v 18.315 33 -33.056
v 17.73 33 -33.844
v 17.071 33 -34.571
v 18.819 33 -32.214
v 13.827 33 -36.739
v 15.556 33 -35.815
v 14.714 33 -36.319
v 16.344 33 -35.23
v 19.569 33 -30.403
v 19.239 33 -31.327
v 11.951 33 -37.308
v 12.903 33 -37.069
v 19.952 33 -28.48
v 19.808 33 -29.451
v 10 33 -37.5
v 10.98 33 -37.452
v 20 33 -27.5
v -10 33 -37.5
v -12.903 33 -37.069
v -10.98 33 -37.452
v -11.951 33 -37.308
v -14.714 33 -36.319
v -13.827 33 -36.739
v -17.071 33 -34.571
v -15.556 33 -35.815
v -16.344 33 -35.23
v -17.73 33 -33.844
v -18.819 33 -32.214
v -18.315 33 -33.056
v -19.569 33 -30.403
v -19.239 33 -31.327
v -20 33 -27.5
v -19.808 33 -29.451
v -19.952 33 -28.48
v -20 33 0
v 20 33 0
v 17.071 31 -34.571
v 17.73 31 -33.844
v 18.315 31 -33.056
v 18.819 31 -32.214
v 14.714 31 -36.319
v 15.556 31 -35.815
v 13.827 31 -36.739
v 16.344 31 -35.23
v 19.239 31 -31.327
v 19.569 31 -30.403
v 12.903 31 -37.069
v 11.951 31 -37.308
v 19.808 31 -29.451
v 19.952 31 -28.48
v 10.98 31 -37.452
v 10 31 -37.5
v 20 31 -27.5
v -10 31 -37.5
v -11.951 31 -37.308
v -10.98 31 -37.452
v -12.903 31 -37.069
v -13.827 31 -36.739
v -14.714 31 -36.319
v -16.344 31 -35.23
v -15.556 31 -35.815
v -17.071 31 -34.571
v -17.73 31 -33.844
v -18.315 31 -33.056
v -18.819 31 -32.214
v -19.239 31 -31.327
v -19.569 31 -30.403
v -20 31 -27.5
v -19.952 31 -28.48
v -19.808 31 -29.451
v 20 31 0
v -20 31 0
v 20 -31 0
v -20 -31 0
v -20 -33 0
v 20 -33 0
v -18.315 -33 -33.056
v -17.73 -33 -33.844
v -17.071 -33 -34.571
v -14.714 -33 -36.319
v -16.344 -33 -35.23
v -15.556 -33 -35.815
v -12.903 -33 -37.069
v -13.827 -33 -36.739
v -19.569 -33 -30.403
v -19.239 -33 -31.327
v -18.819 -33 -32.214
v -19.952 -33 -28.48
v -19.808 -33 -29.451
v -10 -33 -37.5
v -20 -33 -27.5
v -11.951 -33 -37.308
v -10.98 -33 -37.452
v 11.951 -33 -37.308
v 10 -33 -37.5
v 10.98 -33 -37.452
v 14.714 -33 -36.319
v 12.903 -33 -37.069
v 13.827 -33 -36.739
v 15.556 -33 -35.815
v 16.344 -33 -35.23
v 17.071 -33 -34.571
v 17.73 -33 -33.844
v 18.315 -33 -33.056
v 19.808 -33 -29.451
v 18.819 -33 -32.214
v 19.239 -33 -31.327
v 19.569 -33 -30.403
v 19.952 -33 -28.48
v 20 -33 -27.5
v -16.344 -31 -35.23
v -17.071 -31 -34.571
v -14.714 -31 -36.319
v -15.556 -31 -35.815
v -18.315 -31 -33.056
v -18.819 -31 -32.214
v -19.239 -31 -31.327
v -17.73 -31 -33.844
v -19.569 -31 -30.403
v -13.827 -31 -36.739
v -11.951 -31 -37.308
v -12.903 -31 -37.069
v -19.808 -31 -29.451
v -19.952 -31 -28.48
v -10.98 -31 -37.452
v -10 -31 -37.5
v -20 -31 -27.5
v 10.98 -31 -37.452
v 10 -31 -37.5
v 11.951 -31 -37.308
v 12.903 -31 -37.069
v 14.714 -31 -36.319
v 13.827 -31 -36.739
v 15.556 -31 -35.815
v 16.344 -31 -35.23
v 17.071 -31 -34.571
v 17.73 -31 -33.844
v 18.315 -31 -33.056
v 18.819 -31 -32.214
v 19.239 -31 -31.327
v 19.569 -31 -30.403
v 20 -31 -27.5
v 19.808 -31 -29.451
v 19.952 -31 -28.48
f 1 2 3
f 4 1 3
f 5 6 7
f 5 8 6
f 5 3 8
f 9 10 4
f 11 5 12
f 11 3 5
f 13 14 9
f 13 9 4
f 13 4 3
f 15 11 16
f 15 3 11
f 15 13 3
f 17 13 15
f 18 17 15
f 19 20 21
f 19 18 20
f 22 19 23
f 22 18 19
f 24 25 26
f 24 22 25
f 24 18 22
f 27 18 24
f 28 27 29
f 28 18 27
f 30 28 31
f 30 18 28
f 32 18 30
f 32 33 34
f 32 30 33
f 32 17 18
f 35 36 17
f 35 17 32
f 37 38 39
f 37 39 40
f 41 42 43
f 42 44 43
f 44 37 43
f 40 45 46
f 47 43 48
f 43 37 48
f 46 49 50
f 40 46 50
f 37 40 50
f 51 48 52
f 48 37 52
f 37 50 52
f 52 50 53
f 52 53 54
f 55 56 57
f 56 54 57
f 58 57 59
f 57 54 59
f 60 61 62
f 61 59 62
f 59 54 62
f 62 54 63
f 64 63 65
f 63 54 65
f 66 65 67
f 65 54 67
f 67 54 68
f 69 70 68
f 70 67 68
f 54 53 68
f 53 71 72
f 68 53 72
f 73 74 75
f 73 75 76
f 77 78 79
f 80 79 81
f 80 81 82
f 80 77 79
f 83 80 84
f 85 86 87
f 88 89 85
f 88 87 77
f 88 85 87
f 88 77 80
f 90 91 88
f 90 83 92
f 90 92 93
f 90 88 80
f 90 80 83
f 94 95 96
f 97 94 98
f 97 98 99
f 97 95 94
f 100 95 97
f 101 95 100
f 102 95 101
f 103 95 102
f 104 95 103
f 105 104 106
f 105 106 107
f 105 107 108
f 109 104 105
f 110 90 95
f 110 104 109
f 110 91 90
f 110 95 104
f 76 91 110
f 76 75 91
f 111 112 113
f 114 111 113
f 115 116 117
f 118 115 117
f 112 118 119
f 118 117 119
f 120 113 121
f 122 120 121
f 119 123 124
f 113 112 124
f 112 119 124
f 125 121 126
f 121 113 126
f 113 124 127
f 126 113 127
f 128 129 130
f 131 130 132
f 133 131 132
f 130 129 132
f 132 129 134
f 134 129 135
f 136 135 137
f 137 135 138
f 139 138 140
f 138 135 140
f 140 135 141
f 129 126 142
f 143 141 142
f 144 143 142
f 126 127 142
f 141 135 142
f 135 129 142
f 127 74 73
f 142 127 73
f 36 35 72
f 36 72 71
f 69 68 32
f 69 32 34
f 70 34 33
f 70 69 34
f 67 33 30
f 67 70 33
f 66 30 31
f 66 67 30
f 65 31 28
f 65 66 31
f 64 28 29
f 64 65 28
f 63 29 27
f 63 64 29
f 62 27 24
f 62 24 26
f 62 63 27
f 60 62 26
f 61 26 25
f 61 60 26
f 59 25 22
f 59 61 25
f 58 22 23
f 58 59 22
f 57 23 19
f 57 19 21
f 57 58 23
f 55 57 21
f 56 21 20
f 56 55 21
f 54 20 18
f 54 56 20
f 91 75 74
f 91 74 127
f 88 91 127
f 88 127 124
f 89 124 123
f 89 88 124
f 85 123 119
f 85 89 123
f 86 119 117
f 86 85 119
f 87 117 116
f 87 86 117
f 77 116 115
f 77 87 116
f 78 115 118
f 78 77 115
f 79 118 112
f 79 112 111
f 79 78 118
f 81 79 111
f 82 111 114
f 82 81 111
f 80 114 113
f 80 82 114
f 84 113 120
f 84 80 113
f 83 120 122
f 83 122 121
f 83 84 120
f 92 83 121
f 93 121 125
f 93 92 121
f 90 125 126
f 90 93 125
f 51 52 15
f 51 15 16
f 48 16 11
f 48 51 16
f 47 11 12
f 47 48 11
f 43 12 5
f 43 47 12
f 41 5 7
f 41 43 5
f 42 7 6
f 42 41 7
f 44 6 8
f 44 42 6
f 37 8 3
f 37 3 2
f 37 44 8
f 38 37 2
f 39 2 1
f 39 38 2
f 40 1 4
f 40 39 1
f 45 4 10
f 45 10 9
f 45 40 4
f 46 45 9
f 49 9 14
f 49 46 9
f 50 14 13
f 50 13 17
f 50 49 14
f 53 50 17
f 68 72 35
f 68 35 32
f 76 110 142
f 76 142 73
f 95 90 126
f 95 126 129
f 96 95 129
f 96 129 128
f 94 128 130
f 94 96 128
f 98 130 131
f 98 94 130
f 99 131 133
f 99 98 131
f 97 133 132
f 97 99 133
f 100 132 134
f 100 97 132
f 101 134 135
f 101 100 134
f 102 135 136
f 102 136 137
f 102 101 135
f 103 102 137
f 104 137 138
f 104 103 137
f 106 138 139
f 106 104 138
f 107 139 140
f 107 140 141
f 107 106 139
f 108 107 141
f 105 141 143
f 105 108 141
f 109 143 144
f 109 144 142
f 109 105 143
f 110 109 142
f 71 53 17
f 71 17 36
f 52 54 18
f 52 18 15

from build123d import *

# Parameters (mm, degrees)
F1_DEPTH  = 50
F2_R      = 5
F4_DEPTH  = 1
F5_T      = -2
F8_DEPTH  = 1
F10_COUNT = 4
F12_DEPTH = 66.001


with BuildPart() as f1:
    # F0 (on Top) → F1 (new body)
    with BuildSketch(Plane.XY):
        with BuildLine():
            Line((-24.8, -33), (24.8, -33))
            ThreePointArc((24.8, -33), (30.598276, -30.598276), (33, -24.8))
            Line((33, -24.8), (33, 24.8))
            ThreePointArc((33, 24.8), (30.598276, 30.598276), (24.8, 33))
            Line((24.8, 33), (-24.8, 33))
            ThreePointArc((-24.8, 33), (-30.598276, 30.598276), (-33, 24.8))
            Line((-33, 24.8), (-33, -24.8))
            ThreePointArc((-33, -24.8), (-30.598276, -30.598276), (-24.8, -33))
        make_face()
    extrude(amount=-F1_DEPTH)

    # F2
    f2_edges = [f1.edges().sort_by_distance(p)[0] for p in [
        (0, -33, -50),
    ]]
    fillet(f2_edges, radius=F2_R)

    # F3 (on face) → F4 (join)
    with BuildSketch(Plane(origin=(0, 0, -50), x_dir=(1, 0, 0), z_dir=(0, 0, -1))):
        with BuildLine():
            Line((-24.8, -28), (24.8, -28))
            ThreePointArc((24.8, -28), (27.062742, -27.062742), (28, -24.8))
            Line((28, -24.8), (28, 24.8))
            ThreePointArc((28, 24.8), (27.062742, 27.062742), (24.8, 28))
            Line((24.8, 28), (-24.8, 28))
            ThreePointArc((-24.8, 28), (-27.062742, 27.062742), (-28, 24.8))
            Line((-28, 24.8), (-28, -24.8))
            ThreePointArc((-28, -24.8), (-27.062742, -27.062742), (-24.8, -28))
        make_face()
        with BuildLine():
            ThreePointArc((24.8, 27), (26.355635, 26.355635), (27, 24.8))
            Line((27, 24.8), (27, -24.8))
            ThreePointArc((27, -24.8), (26.355635, -26.355635), (24.8, -27))
            Line((24.8, -27), (-24.8, -27))
            ThreePointArc((-24.8, -27), (-26.355635, -26.355635), (-27, -24.8))
            Line((-27, -24.8), (-27, 24.8))
            ThreePointArc((-27, 24.8), (-26.355635, 26.355635), (-24.8, 27))
            Line((-24.8, 27), (24.8, 27))
        make_face(mode=Mode.SUBTRACT)
    extrude(amount=F4_DEPTH)

    # F5
    f5_openings = [f1.faces().sort_by_distance(p)[0] for p in [
        (0, 0, 0),
    ]]
    offset(amount=F5_T, openings=f5_openings)

    # F7 (on offset) → F8 (cut)
    with BuildSketch(Plane.XY.offset(-3)):
        with BuildLine():
            Line((24.8, -32), (24.8, -33))
            ThreePointArc((24.8, -33), (30.598276, -30.598276), (33, -24.8))
            Line((33, -24.8), (32, -24.8))
            ThreePointArc((32, -24.8), (29.891169, -29.891169), (24.8, -32))
        make_face()
    extrude(amount=-F8_DEPTH, mode=Mode.SUBTRACT)


with BuildPart() as f10_1:
    # F10: instance of F1
    add(f1.part.rotate(Axis((0, 0, 5.949285), (0, 0, 1)), 1 * 360 / F10_COUNT))


with BuildPart() as f10_2:
    # F10: instance of F1
    add(f1.part.rotate(Axis((0, 0, 5.949285), (0, 0, 1)), 2 * 360 / F10_COUNT))


with BuildPart() as f10_3:
    # F10: instance of F1
    add(f1.part.rotate(Axis((0, 0, 5.949285), (0, 0, 1)), 3 * 360 / F10_COUNT))


with BuildPart() as f12_tool:
    # F11 (on face) → F12 (new body, through all)
    with BuildSketch(Plane.XZ.offset(33)):
        with BuildLine():
            Line((-10, -37.5), (10, -37.5))
            ThreePointArc((10, -37.5), (17.071068, -34.571068), (20, -27.5))
            Line((20, -27.5), (20, 0))
            Line((20, 0), (0, 0))
            Line((0, 0), (-20, 0))
            Line((-20, 0), (-20, -27.5))
            ThreePointArc((-20, -27.5), (-17.071068, -34.571068), (-10, -37.5))
        make_face()
    extrude(amount=-F12_DEPTH)


with BuildPart() as f1_1:
    add(f1.part)

    # F12: intersect by f12_tool
    add(f12_tool.part, mode=Mode.INTERSECT)


with BuildPart() as f10_1_1:
    add(f10_1.part)

    # F12: intersect by f12_tool
    add(f12_tool.part, mode=Mode.INTERSECT)


with BuildPart() as f10_2_1:
    add(f10_2.part)

    # F12: intersect by f12_tool
    add(f12_tool.part, mode=Mode.INTERSECT)


with BuildPart() as f10_3_1:
    add(f10_3.part)

    # F12: intersect by f12_tool
    add(f12_tool.part, mode=Mode.INTERSECT)


solid = f1_1.part
